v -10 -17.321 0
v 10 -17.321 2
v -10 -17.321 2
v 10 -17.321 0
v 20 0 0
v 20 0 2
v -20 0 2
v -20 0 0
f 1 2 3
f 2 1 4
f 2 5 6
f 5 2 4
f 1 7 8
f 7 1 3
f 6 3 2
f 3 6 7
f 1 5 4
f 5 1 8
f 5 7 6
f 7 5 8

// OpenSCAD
height = 2;
radius = 20;

difference() {
    cylinder(height, radius, radius, $fn=6);
    translate([-radius,0,-radius/4]){
        cube([radius*2, radius, radius]);
    }    
}
